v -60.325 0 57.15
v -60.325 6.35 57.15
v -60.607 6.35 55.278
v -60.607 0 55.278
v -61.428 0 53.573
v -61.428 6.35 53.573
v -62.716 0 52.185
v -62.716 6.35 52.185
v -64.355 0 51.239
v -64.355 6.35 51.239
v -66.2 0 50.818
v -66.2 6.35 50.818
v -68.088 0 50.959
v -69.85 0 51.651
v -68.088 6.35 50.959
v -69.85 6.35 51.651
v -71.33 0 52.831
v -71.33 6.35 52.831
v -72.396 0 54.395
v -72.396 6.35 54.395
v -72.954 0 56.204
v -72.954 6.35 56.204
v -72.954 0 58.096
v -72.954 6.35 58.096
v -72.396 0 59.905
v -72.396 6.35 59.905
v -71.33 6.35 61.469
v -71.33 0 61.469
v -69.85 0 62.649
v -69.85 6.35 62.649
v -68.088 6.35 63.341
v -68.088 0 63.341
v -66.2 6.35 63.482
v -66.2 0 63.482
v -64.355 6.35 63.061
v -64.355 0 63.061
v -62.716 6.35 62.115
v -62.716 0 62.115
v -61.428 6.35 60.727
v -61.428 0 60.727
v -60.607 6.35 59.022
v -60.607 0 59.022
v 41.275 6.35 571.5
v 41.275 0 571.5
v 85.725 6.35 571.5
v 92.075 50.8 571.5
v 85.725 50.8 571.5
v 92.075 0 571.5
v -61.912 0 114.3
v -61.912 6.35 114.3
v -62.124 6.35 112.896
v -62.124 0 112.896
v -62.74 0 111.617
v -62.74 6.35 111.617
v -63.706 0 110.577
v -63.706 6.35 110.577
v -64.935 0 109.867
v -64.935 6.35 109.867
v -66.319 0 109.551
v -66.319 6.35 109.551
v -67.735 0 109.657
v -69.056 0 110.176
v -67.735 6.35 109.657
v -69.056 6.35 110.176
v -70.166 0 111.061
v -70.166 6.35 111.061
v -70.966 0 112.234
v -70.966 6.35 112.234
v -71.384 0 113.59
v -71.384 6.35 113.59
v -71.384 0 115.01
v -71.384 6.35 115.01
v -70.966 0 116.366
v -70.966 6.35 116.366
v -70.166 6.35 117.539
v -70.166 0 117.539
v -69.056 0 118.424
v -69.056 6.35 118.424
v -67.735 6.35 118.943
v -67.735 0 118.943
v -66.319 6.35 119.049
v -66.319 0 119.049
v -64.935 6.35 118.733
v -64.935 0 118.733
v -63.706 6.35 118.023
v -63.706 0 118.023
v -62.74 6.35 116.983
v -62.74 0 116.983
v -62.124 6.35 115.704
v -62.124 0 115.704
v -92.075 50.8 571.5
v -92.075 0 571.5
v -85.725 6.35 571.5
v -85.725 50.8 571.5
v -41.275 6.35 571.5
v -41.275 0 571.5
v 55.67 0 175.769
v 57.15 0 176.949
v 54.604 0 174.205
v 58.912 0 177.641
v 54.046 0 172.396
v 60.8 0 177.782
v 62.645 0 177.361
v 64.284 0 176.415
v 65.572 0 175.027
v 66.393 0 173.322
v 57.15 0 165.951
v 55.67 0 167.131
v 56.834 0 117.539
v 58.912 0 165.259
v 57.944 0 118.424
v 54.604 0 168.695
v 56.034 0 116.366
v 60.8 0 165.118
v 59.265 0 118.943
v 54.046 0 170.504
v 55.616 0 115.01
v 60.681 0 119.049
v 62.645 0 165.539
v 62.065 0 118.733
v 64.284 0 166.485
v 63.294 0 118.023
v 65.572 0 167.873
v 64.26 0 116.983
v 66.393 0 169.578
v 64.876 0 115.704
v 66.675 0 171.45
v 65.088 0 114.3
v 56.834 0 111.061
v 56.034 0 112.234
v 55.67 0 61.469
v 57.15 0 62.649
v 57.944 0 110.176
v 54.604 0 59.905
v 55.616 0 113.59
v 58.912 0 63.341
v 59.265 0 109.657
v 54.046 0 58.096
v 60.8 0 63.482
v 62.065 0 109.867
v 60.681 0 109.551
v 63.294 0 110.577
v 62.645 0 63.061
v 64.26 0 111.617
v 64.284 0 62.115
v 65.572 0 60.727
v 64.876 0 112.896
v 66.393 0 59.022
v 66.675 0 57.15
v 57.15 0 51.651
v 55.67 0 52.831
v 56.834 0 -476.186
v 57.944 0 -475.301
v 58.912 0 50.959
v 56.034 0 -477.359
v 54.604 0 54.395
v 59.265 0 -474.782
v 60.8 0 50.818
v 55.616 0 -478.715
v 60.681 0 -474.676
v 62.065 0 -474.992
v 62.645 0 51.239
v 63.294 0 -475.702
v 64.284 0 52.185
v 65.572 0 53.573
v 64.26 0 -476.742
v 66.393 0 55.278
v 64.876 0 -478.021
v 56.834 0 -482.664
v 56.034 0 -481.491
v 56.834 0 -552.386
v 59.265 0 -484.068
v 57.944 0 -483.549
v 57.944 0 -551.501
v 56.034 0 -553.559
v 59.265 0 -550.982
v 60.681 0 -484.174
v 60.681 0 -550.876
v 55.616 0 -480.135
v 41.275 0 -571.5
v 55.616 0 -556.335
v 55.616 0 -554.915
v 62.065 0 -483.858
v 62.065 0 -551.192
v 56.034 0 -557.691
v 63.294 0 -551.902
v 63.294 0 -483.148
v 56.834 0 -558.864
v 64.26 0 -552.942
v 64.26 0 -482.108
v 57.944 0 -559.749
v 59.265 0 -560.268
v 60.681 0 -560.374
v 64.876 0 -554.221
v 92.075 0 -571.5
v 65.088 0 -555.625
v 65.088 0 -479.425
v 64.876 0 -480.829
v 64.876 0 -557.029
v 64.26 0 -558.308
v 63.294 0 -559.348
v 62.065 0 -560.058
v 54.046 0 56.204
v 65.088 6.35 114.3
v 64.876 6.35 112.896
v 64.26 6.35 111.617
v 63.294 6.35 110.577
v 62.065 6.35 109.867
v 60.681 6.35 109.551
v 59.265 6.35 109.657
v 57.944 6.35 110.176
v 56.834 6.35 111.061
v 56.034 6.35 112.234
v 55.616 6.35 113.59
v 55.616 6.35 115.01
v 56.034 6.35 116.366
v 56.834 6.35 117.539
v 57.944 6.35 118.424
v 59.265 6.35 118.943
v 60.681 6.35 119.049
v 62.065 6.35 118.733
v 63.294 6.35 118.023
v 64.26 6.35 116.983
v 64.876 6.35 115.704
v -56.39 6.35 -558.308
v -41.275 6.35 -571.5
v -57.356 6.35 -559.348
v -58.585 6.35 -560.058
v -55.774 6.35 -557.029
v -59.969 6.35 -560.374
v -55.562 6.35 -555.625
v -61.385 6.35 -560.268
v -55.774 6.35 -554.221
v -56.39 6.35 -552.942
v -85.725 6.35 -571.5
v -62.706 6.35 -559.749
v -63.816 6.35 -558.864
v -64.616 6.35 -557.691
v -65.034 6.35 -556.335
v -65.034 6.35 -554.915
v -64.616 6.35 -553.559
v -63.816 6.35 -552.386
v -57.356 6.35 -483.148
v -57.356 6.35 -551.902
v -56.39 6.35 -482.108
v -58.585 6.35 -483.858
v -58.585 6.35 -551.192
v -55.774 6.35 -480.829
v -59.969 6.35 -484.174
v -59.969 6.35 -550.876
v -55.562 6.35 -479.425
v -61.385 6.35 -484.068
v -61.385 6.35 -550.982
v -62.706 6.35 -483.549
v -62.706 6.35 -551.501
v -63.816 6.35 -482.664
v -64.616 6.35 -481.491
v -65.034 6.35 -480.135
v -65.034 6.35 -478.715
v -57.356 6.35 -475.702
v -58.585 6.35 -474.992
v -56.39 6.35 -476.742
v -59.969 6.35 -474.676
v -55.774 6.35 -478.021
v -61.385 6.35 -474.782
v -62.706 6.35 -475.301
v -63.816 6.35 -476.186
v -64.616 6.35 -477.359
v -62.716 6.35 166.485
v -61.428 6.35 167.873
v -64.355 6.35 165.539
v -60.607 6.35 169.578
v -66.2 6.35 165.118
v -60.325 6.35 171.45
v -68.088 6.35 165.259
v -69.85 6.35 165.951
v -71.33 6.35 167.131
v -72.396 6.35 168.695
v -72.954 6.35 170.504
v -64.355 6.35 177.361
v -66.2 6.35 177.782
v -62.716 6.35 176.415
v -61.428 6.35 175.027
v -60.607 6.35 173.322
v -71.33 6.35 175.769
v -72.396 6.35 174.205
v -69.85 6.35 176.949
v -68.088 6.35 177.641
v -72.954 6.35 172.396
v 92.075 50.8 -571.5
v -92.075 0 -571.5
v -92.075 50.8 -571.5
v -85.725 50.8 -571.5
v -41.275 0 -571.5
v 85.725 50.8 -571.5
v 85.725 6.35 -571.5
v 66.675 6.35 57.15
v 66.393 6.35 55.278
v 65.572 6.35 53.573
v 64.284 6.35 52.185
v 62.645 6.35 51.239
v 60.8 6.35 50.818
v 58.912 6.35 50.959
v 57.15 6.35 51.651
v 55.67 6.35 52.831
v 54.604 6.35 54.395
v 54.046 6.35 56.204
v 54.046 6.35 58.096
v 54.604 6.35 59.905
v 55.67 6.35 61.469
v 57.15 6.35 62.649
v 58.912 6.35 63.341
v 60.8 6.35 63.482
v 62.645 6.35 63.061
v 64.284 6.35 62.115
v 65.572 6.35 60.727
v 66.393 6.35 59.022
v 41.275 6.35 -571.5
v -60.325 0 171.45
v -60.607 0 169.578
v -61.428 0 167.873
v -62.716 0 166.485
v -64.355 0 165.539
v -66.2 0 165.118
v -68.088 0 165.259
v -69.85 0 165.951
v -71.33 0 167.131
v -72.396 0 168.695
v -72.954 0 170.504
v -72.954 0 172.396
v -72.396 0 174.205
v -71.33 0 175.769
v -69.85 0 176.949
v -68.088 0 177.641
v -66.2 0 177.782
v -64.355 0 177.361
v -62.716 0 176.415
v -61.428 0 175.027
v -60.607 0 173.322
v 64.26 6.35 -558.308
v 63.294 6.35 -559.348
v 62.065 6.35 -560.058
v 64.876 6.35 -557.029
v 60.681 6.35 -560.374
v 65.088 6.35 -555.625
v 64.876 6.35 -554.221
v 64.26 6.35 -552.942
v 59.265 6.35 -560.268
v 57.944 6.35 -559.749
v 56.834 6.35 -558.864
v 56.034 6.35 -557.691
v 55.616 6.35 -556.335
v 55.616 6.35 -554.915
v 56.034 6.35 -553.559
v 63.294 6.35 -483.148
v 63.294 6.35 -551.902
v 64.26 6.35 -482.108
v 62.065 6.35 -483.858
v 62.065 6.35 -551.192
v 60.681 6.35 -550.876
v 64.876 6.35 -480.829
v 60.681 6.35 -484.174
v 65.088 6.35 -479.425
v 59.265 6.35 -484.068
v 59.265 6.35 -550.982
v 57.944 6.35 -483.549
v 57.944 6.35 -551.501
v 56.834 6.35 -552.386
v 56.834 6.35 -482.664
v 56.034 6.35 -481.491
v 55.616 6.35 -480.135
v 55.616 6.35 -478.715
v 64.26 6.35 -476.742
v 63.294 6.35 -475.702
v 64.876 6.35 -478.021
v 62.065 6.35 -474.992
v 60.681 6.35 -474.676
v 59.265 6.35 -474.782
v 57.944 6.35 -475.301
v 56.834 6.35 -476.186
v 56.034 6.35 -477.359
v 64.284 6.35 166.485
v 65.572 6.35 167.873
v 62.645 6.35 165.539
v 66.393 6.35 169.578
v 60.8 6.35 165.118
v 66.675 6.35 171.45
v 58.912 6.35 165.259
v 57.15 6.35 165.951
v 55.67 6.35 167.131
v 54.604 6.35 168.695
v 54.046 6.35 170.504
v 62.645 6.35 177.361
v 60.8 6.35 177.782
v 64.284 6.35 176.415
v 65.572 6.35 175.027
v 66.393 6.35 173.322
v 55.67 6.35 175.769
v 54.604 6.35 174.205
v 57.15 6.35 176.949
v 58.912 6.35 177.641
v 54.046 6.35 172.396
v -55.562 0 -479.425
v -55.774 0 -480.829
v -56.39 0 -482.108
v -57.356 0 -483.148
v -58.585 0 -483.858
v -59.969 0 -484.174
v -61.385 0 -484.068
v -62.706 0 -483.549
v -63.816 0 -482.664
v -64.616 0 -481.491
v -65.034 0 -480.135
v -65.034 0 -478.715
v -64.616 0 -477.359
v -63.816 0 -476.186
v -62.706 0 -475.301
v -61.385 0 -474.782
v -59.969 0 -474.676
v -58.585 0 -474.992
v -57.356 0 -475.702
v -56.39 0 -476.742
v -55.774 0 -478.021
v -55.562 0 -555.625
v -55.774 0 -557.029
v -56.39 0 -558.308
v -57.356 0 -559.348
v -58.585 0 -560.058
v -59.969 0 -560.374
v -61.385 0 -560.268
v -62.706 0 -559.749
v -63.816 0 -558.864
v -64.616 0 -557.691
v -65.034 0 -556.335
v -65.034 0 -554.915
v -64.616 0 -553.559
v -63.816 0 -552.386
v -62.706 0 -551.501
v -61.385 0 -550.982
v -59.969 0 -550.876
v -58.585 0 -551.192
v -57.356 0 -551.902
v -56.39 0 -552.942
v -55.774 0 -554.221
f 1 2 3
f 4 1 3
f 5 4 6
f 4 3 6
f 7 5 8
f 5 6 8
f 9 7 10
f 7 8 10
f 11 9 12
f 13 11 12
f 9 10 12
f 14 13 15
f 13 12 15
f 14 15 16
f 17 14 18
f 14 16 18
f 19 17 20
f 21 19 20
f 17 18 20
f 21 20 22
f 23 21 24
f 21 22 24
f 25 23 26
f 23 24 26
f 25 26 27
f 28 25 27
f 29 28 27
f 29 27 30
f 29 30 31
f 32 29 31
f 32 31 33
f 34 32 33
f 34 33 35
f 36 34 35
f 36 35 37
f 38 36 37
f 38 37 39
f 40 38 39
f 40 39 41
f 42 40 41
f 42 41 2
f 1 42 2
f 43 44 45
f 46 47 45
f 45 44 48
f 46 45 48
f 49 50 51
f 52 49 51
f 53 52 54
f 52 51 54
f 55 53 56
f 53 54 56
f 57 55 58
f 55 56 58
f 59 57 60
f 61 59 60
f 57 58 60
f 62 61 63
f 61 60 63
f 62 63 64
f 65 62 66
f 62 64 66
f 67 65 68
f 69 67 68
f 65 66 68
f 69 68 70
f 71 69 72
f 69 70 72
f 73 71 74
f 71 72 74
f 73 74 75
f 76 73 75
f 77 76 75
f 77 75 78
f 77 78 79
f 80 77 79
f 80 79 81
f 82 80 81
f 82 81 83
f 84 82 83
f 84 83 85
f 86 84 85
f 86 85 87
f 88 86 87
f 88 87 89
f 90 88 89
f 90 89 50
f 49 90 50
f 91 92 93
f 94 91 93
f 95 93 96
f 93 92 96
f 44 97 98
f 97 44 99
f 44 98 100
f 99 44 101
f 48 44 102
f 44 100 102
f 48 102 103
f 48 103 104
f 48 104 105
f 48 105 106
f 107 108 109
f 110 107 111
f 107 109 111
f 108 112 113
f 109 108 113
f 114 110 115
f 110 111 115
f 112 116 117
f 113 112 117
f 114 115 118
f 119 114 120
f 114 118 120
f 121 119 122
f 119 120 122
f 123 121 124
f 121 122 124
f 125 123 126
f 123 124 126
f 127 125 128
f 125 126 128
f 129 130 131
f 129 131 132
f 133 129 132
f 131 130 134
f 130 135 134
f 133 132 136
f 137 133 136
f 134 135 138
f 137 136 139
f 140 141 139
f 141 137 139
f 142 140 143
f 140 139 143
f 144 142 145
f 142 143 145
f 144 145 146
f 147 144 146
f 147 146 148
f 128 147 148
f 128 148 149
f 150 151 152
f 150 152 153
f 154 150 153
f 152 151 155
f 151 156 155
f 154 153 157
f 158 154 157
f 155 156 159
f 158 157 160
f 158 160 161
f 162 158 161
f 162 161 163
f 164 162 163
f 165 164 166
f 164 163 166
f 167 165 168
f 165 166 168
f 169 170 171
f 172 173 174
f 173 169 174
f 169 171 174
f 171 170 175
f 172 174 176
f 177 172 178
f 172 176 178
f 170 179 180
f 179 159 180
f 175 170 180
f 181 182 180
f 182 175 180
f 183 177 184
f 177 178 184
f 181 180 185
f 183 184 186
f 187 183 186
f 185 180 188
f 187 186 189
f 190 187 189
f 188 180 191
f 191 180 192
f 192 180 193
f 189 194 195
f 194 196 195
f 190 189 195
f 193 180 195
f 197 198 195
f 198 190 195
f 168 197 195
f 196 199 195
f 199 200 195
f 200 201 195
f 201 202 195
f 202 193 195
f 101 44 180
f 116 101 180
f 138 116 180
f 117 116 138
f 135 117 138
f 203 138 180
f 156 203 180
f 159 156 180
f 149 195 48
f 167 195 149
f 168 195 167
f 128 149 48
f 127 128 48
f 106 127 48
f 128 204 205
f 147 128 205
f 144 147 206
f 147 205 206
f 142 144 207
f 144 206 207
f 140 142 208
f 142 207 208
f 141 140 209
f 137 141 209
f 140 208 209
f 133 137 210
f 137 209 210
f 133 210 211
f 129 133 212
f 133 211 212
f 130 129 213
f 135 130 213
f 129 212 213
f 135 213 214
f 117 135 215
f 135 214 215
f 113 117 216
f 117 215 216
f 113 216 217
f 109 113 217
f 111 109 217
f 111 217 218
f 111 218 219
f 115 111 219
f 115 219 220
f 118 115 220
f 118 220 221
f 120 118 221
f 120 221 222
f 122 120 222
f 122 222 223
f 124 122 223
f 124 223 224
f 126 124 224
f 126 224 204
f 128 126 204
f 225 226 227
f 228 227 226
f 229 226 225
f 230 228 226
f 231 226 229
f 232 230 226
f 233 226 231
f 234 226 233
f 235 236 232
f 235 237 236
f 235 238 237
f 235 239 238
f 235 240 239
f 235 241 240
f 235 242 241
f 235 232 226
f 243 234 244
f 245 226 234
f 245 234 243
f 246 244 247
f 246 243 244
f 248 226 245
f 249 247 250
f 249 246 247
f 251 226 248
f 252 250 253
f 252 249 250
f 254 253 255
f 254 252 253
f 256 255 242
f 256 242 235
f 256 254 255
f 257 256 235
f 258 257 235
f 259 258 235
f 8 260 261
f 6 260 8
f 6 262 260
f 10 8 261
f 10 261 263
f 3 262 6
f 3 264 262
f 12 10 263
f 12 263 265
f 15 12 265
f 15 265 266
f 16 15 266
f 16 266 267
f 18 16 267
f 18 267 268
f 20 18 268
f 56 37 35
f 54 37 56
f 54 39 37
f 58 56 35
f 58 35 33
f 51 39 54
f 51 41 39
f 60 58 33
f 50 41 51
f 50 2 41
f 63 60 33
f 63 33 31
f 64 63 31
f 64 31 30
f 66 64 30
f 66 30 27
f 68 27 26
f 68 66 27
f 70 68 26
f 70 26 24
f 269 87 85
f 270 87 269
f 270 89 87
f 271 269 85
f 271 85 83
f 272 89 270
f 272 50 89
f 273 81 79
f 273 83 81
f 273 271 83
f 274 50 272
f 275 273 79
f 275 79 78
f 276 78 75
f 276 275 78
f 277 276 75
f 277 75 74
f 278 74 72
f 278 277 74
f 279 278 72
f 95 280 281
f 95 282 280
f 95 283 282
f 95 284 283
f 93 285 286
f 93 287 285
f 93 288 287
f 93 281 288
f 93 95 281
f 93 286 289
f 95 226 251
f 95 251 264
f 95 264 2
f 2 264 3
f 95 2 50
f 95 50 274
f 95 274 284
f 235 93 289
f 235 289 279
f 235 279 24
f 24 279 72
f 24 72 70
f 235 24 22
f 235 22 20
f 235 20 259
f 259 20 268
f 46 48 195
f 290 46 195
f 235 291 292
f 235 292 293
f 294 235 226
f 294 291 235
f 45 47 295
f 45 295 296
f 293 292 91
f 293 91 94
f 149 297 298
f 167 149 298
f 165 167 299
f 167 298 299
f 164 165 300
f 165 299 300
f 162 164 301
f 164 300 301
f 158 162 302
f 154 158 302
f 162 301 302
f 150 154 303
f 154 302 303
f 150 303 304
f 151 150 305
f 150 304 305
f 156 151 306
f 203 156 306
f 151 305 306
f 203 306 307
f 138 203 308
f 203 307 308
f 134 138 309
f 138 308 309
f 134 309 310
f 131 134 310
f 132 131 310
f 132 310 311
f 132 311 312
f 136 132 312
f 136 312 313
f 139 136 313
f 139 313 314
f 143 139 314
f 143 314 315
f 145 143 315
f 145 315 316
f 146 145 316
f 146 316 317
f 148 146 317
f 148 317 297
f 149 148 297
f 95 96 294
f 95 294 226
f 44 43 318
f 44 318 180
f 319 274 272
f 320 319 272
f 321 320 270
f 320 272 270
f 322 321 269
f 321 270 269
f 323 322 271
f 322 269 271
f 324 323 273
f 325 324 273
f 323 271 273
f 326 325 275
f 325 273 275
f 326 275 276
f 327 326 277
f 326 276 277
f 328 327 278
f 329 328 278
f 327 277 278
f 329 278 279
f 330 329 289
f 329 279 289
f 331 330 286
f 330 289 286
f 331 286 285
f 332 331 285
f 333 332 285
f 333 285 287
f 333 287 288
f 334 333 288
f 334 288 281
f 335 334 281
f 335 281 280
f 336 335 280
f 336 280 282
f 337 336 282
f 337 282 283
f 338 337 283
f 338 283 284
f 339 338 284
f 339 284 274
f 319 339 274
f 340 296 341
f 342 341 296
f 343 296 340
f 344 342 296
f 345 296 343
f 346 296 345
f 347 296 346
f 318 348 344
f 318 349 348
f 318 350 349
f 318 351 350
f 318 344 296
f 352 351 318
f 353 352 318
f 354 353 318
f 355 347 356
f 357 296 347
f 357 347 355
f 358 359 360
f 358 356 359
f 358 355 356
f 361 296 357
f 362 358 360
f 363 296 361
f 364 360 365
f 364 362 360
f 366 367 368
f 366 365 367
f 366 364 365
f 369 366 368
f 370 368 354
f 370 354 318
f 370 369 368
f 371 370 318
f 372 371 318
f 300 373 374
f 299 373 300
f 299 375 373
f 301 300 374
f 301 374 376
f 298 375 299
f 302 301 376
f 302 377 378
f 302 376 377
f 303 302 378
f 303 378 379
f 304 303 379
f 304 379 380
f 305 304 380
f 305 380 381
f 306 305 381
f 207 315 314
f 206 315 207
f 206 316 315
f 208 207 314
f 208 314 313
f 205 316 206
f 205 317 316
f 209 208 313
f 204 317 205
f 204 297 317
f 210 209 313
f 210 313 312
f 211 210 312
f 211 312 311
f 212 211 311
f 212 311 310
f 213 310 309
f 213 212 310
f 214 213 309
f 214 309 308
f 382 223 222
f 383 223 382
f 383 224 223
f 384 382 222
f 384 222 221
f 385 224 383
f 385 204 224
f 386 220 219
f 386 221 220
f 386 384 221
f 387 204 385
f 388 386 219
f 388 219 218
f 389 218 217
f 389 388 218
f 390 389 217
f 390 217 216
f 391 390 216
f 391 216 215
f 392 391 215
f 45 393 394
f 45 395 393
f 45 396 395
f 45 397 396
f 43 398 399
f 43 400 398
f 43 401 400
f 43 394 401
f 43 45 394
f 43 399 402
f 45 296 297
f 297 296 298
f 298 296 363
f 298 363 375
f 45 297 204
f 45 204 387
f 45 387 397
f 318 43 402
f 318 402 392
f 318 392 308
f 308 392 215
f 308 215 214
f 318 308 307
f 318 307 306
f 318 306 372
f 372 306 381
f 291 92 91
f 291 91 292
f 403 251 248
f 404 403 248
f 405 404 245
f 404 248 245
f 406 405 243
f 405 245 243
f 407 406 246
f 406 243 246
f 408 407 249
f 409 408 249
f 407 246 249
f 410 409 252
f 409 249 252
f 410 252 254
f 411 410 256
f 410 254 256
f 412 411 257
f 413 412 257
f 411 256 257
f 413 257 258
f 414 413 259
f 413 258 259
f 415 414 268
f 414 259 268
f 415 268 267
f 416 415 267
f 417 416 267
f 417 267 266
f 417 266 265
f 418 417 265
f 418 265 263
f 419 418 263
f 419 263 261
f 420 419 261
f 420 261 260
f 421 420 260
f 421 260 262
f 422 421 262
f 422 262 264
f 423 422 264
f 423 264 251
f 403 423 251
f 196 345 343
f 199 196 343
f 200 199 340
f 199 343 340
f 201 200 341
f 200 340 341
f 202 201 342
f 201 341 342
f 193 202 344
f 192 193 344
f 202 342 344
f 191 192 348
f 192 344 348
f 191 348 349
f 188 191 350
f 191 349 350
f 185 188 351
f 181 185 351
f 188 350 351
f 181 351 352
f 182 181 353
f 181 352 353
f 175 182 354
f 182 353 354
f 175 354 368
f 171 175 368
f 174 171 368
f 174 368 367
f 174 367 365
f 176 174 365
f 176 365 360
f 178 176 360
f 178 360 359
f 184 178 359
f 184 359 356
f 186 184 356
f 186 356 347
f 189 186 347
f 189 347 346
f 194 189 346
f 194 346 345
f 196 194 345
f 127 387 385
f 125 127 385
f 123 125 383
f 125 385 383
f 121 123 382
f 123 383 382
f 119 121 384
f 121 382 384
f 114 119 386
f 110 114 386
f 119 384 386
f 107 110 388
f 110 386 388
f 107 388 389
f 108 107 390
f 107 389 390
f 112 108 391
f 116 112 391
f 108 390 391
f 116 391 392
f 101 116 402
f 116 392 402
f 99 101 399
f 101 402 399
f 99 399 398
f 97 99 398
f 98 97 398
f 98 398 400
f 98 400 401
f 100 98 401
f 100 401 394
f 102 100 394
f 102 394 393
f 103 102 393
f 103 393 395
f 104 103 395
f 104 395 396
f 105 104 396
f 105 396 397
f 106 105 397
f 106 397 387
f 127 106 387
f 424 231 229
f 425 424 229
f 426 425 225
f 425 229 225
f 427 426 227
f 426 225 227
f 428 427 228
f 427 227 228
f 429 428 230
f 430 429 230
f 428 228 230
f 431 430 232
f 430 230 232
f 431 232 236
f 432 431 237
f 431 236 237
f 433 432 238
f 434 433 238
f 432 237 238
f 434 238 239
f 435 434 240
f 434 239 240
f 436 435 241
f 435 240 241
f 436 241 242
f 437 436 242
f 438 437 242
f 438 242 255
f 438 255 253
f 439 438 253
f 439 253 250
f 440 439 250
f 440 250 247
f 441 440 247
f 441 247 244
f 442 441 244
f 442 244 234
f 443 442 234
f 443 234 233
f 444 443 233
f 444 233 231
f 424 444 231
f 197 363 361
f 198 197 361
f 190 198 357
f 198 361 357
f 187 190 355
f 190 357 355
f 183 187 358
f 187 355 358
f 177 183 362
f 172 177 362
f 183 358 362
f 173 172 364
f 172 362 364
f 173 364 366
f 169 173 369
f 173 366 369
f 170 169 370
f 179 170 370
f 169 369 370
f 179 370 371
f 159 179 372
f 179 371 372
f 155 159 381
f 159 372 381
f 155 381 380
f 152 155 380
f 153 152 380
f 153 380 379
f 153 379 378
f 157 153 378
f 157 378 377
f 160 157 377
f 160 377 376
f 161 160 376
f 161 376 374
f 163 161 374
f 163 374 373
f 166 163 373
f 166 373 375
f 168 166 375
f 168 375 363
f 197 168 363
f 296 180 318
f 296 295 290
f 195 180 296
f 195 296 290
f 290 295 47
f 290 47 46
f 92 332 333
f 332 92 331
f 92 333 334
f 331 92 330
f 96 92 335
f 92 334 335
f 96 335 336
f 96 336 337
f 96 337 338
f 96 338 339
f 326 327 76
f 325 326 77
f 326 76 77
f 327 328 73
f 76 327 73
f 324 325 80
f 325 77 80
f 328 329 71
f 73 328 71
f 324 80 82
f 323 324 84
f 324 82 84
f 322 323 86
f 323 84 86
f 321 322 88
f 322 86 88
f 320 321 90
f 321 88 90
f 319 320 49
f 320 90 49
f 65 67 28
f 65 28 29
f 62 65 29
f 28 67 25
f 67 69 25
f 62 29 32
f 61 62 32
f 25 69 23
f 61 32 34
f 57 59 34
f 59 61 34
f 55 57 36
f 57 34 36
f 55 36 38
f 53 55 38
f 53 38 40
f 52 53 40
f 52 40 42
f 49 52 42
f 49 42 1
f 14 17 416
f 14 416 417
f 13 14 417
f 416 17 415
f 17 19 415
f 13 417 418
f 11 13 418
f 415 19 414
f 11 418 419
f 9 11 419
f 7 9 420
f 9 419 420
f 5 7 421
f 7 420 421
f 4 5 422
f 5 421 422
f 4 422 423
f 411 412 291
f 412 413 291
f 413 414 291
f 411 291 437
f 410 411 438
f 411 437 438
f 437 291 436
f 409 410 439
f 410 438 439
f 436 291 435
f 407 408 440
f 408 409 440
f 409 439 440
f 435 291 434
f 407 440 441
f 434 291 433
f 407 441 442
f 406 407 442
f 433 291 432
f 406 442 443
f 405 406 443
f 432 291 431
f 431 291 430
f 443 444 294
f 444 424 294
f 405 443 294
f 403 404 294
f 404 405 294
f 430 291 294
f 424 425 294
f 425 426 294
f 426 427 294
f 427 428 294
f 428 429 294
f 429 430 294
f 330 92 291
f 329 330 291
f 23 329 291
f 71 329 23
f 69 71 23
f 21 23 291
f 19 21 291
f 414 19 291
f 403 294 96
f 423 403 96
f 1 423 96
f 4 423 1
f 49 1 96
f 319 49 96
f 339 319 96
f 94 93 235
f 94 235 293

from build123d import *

# Parameters (mm, degrees)
SKETCH1_W            = 184.15
SKETCH1_H            = 1143
BOSS_EXTRUDE1_DEPTH  = 50.8
CUT_EXTRUDE1_DEPTH   = 1144
SKETCH3_R            = 4.7625
SKETCH3_R_2          = 6.35
BOLT_HOLE_CUTS_DEPTH = 7.35


with BuildPart() as part:
    # Sketch1 → Boss-Extrude1 (new body)
    with BuildSketch(Plane(origin=(0, 0, 0), x_dir=(1, 0, 0), z_dir=(0, 1, 0))):
        Rectangle(SKETCH1_W, SKETCH1_H)
    extrude(amount=BOSS_EXTRUDE1_DEPTH)

    # Sketch2 → Cut-Extrude1 (cut, through all)
    with BuildSketch(Plane.XY.offset(571.5)):
        Polygon((-85.725, 50.8), (85.725, 50.8), (85.725, 6.35), (41.275, 6.35), (41.275, 0), (-41.275, 0), (-41.275, 6.35), (-85.725, 6.35), align=None)
    extrude(amount=-CUT_EXTRUDE1_DEPTH, mode=Mode.SUBTRACT)

    # Sketch3 → Bolt Hole Cuts (cut, through all)
    with BuildSketch(Plane(origin=(0, 6.35, 0), x_dir=(1, 0, 0), z_dir=(0, 1, 0))):
        with Locations((-60.325, 555.625)):
            Circle(SKETCH3_R)
        with Locations((-60.325, 479.425)):
            Circle(SKETCH3_R)
        with Locations((-66.675, -114.3)):
            Circle(SKETCH3_R)
        with Locations((60.325, 555.625)):
            Circle(SKETCH3_R)
        with Locations((60.325, 479.425)):
            Circle(SKETCH3_R)
        with Locations((60.325, -114.3)):
            Circle(SKETCH3_R)
        with Locations((-66.675, -57.15)):
            Circle(SKETCH3_R_2)
        with Locations((-66.675, -171.45)):
            Circle(SKETCH3_R_2)
        with Locations((60.325, -57.15)):
            Circle(SKETCH3_R_2)
        with Locations((60.325, -171.45)):
            Circle(SKETCH3_R_2)
    extrude(amount=-BOLT_HOLE_CUTS_DEPTH, mode=Mode.SUBTRACT)


solid = part.part
